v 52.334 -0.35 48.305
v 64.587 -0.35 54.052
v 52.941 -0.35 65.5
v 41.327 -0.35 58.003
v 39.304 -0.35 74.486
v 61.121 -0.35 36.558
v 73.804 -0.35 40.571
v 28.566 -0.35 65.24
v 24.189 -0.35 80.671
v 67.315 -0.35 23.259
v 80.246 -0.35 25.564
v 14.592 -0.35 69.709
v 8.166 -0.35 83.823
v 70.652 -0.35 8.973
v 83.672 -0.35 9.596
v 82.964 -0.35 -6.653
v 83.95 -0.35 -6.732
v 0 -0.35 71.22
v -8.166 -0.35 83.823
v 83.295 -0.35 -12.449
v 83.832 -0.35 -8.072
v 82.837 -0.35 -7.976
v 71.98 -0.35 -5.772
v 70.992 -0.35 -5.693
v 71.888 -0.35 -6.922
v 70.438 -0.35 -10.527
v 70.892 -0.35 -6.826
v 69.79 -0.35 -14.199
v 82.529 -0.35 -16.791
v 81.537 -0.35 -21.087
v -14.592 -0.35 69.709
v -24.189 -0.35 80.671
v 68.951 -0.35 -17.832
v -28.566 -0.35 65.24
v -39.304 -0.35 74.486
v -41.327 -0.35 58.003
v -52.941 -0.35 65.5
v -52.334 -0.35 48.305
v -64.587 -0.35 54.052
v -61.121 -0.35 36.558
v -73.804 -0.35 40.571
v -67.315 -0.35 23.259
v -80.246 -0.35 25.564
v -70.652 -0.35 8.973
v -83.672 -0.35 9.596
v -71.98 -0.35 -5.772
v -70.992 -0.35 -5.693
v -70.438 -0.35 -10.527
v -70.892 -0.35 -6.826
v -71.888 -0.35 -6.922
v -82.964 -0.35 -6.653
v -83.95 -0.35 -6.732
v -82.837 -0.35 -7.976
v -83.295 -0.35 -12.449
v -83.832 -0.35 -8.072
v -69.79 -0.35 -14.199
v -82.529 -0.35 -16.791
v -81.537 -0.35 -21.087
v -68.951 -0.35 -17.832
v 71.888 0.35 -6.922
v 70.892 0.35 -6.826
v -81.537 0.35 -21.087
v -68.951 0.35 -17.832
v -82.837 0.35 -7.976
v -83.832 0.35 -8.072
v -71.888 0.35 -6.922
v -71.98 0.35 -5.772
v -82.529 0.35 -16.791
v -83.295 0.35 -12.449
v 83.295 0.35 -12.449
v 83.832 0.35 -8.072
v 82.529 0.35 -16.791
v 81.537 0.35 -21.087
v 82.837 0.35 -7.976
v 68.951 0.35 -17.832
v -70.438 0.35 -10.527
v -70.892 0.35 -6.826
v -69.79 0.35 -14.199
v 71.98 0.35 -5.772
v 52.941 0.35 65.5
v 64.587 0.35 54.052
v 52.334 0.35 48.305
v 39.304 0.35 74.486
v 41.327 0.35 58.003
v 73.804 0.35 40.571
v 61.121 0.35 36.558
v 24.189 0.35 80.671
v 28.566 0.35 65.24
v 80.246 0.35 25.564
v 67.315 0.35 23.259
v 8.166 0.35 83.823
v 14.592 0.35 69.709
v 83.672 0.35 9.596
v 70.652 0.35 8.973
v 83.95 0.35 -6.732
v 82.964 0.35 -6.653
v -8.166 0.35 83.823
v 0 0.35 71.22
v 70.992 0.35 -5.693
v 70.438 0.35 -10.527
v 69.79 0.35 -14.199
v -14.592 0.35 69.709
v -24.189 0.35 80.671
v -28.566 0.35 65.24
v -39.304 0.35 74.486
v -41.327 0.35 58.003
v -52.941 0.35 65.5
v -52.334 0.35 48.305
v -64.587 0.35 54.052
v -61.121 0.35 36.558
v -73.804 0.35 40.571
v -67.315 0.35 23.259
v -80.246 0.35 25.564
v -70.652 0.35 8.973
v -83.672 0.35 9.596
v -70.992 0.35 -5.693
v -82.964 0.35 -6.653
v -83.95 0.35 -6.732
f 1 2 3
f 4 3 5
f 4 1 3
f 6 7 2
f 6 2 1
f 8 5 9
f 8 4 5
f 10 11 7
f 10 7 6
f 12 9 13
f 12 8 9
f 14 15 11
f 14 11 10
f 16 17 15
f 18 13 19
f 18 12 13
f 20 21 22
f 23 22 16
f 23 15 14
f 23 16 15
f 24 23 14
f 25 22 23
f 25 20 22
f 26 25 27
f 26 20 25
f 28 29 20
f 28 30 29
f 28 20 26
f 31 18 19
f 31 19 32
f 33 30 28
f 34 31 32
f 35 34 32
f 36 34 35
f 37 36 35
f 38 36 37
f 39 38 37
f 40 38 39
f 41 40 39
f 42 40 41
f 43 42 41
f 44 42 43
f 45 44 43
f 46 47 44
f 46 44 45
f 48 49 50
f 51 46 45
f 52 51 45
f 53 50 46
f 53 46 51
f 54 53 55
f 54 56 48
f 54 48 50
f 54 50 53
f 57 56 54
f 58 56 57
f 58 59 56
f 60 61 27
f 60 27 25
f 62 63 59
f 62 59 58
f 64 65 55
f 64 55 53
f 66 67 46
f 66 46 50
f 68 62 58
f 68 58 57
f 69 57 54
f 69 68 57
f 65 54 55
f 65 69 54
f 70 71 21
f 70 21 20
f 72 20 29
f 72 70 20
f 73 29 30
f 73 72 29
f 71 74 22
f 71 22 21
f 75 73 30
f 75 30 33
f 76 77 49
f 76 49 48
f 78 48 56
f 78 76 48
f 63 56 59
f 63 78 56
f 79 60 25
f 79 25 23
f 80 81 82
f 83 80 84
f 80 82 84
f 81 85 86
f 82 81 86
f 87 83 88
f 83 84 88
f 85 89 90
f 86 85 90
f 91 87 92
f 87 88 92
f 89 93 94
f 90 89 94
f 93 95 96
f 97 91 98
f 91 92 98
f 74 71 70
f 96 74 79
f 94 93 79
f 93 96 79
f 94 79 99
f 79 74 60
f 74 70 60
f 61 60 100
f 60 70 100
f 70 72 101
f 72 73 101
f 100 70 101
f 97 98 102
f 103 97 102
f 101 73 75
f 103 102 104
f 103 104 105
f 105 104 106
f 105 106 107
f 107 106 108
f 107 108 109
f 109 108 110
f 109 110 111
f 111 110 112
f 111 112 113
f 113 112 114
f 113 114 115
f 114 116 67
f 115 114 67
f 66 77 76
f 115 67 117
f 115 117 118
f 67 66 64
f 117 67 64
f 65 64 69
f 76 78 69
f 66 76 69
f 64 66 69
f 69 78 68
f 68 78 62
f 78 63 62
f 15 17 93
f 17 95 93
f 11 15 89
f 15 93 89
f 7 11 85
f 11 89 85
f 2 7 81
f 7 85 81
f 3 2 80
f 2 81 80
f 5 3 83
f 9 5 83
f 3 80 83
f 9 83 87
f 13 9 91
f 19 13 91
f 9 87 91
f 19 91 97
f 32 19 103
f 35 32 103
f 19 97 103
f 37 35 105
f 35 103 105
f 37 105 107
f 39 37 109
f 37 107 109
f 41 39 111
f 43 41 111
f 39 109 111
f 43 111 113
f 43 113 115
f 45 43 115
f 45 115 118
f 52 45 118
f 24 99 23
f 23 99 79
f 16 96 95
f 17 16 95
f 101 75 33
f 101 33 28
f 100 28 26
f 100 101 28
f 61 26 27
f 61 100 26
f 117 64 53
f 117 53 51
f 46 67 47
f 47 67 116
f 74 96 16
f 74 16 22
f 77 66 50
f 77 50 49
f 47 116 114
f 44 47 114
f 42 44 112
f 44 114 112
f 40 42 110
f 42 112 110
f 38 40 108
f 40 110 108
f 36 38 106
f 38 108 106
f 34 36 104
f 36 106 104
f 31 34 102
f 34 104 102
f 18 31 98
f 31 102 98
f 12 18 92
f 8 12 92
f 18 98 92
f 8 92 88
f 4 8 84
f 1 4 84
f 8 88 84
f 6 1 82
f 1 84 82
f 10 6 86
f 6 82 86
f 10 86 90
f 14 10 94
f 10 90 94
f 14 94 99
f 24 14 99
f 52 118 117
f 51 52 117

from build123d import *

# Parameters (mm, degrees)
BOSS_EXTRUDE1_DEPTH = 0.35
BOSS_EXTRUDE2_DEPTH = 0.7


with BuildPart() as part:
    # Sketch1 → Boss-Extrude1 (new, symmetric)
    with BuildSketch(Plane(origin=(0, 0, 0), x_dir=(1, 0, 0), z_dir=(0, 1, 0))):
        with BuildLine():
            Line((70.992084628, 5.693181902), (83.950482552, 6.732375453))
            ThreePointArc((83.950482552, 6.732375453), (0, -84.22), (-83.950482552, 6.732375453))
            Line((-83.950482552, 6.732375453), (-70.992084628, 5.693181902))
            ThreePointArc((-70.992084628, 5.693181902), (0, -71.22), (70.992084628, 5.693181902))
        make_face()
    extrude(amount=BOSS_EXTRUDE1_DEPTH, both=True)

    # Sketch2 → Boss-Extrude2 (add)
    with BuildSketch(Plane(origin=(0, 0.35, 0), x_dir=(1, 0, 0), z_dir=(0, 1, 0))):
        with BuildLine():
            Line((71.979704881, 5.772383714), (82.964261813, 6.653285874))
            Line((82.964261813, 6.653285874), (82.836871628, 7.976283525))
            Line((82.836871628, 7.976283525), (83.832267826, 8.072129277))
            ThreePointArc((83.832267826, 8.072129277), (82.940508959, 14.624649523), (81.537394273, 21.087003941))
            Line((81.537394273, 21.087003941), (68.951474948, 17.832063889))
            ThreePointArc((68.951474948, 17.832063889), (70.13800817, 12.367223213), (70.892117248, 6.826134494))
            Line((70.892117248, 6.826134494), (71.887513446, 6.921980247))
            Line((71.887513446, 6.921980247), (71.979704881, 5.772383714))
        make_face()
        with BuildLine():
            Line((-82.964261813, 6.653285874), (-71.979704881, 5.772383714))
            Line((-71.979704881, 5.772383714), (-71.887513446, 6.921980247))
            Line((-71.887513446, 6.921980247), (-70.892117248, 6.826134494))
            ThreePointArc((-70.892117248, 6.826134494), (-70.13800817, 12.367223213), (-68.951474948, 17.832063889))
            Line((-68.951474948, 17.832063889), (-81.537394273, 21.087003941))
            ThreePointArc((-81.537394273, 21.087003941), (-82.940508959, 14.624649523), (-83.832267826, 8.072129277))
            Line((-83.832267826, 8.072129277), (-82.836871628, 7.976283525))
            Line((-82.836871628, 7.976283525), (-82.964261813, 6.653285874))
        make_face()
    extrude(amount=-BOSS_EXTRUDE2_DEPTH)


solid = part.part
